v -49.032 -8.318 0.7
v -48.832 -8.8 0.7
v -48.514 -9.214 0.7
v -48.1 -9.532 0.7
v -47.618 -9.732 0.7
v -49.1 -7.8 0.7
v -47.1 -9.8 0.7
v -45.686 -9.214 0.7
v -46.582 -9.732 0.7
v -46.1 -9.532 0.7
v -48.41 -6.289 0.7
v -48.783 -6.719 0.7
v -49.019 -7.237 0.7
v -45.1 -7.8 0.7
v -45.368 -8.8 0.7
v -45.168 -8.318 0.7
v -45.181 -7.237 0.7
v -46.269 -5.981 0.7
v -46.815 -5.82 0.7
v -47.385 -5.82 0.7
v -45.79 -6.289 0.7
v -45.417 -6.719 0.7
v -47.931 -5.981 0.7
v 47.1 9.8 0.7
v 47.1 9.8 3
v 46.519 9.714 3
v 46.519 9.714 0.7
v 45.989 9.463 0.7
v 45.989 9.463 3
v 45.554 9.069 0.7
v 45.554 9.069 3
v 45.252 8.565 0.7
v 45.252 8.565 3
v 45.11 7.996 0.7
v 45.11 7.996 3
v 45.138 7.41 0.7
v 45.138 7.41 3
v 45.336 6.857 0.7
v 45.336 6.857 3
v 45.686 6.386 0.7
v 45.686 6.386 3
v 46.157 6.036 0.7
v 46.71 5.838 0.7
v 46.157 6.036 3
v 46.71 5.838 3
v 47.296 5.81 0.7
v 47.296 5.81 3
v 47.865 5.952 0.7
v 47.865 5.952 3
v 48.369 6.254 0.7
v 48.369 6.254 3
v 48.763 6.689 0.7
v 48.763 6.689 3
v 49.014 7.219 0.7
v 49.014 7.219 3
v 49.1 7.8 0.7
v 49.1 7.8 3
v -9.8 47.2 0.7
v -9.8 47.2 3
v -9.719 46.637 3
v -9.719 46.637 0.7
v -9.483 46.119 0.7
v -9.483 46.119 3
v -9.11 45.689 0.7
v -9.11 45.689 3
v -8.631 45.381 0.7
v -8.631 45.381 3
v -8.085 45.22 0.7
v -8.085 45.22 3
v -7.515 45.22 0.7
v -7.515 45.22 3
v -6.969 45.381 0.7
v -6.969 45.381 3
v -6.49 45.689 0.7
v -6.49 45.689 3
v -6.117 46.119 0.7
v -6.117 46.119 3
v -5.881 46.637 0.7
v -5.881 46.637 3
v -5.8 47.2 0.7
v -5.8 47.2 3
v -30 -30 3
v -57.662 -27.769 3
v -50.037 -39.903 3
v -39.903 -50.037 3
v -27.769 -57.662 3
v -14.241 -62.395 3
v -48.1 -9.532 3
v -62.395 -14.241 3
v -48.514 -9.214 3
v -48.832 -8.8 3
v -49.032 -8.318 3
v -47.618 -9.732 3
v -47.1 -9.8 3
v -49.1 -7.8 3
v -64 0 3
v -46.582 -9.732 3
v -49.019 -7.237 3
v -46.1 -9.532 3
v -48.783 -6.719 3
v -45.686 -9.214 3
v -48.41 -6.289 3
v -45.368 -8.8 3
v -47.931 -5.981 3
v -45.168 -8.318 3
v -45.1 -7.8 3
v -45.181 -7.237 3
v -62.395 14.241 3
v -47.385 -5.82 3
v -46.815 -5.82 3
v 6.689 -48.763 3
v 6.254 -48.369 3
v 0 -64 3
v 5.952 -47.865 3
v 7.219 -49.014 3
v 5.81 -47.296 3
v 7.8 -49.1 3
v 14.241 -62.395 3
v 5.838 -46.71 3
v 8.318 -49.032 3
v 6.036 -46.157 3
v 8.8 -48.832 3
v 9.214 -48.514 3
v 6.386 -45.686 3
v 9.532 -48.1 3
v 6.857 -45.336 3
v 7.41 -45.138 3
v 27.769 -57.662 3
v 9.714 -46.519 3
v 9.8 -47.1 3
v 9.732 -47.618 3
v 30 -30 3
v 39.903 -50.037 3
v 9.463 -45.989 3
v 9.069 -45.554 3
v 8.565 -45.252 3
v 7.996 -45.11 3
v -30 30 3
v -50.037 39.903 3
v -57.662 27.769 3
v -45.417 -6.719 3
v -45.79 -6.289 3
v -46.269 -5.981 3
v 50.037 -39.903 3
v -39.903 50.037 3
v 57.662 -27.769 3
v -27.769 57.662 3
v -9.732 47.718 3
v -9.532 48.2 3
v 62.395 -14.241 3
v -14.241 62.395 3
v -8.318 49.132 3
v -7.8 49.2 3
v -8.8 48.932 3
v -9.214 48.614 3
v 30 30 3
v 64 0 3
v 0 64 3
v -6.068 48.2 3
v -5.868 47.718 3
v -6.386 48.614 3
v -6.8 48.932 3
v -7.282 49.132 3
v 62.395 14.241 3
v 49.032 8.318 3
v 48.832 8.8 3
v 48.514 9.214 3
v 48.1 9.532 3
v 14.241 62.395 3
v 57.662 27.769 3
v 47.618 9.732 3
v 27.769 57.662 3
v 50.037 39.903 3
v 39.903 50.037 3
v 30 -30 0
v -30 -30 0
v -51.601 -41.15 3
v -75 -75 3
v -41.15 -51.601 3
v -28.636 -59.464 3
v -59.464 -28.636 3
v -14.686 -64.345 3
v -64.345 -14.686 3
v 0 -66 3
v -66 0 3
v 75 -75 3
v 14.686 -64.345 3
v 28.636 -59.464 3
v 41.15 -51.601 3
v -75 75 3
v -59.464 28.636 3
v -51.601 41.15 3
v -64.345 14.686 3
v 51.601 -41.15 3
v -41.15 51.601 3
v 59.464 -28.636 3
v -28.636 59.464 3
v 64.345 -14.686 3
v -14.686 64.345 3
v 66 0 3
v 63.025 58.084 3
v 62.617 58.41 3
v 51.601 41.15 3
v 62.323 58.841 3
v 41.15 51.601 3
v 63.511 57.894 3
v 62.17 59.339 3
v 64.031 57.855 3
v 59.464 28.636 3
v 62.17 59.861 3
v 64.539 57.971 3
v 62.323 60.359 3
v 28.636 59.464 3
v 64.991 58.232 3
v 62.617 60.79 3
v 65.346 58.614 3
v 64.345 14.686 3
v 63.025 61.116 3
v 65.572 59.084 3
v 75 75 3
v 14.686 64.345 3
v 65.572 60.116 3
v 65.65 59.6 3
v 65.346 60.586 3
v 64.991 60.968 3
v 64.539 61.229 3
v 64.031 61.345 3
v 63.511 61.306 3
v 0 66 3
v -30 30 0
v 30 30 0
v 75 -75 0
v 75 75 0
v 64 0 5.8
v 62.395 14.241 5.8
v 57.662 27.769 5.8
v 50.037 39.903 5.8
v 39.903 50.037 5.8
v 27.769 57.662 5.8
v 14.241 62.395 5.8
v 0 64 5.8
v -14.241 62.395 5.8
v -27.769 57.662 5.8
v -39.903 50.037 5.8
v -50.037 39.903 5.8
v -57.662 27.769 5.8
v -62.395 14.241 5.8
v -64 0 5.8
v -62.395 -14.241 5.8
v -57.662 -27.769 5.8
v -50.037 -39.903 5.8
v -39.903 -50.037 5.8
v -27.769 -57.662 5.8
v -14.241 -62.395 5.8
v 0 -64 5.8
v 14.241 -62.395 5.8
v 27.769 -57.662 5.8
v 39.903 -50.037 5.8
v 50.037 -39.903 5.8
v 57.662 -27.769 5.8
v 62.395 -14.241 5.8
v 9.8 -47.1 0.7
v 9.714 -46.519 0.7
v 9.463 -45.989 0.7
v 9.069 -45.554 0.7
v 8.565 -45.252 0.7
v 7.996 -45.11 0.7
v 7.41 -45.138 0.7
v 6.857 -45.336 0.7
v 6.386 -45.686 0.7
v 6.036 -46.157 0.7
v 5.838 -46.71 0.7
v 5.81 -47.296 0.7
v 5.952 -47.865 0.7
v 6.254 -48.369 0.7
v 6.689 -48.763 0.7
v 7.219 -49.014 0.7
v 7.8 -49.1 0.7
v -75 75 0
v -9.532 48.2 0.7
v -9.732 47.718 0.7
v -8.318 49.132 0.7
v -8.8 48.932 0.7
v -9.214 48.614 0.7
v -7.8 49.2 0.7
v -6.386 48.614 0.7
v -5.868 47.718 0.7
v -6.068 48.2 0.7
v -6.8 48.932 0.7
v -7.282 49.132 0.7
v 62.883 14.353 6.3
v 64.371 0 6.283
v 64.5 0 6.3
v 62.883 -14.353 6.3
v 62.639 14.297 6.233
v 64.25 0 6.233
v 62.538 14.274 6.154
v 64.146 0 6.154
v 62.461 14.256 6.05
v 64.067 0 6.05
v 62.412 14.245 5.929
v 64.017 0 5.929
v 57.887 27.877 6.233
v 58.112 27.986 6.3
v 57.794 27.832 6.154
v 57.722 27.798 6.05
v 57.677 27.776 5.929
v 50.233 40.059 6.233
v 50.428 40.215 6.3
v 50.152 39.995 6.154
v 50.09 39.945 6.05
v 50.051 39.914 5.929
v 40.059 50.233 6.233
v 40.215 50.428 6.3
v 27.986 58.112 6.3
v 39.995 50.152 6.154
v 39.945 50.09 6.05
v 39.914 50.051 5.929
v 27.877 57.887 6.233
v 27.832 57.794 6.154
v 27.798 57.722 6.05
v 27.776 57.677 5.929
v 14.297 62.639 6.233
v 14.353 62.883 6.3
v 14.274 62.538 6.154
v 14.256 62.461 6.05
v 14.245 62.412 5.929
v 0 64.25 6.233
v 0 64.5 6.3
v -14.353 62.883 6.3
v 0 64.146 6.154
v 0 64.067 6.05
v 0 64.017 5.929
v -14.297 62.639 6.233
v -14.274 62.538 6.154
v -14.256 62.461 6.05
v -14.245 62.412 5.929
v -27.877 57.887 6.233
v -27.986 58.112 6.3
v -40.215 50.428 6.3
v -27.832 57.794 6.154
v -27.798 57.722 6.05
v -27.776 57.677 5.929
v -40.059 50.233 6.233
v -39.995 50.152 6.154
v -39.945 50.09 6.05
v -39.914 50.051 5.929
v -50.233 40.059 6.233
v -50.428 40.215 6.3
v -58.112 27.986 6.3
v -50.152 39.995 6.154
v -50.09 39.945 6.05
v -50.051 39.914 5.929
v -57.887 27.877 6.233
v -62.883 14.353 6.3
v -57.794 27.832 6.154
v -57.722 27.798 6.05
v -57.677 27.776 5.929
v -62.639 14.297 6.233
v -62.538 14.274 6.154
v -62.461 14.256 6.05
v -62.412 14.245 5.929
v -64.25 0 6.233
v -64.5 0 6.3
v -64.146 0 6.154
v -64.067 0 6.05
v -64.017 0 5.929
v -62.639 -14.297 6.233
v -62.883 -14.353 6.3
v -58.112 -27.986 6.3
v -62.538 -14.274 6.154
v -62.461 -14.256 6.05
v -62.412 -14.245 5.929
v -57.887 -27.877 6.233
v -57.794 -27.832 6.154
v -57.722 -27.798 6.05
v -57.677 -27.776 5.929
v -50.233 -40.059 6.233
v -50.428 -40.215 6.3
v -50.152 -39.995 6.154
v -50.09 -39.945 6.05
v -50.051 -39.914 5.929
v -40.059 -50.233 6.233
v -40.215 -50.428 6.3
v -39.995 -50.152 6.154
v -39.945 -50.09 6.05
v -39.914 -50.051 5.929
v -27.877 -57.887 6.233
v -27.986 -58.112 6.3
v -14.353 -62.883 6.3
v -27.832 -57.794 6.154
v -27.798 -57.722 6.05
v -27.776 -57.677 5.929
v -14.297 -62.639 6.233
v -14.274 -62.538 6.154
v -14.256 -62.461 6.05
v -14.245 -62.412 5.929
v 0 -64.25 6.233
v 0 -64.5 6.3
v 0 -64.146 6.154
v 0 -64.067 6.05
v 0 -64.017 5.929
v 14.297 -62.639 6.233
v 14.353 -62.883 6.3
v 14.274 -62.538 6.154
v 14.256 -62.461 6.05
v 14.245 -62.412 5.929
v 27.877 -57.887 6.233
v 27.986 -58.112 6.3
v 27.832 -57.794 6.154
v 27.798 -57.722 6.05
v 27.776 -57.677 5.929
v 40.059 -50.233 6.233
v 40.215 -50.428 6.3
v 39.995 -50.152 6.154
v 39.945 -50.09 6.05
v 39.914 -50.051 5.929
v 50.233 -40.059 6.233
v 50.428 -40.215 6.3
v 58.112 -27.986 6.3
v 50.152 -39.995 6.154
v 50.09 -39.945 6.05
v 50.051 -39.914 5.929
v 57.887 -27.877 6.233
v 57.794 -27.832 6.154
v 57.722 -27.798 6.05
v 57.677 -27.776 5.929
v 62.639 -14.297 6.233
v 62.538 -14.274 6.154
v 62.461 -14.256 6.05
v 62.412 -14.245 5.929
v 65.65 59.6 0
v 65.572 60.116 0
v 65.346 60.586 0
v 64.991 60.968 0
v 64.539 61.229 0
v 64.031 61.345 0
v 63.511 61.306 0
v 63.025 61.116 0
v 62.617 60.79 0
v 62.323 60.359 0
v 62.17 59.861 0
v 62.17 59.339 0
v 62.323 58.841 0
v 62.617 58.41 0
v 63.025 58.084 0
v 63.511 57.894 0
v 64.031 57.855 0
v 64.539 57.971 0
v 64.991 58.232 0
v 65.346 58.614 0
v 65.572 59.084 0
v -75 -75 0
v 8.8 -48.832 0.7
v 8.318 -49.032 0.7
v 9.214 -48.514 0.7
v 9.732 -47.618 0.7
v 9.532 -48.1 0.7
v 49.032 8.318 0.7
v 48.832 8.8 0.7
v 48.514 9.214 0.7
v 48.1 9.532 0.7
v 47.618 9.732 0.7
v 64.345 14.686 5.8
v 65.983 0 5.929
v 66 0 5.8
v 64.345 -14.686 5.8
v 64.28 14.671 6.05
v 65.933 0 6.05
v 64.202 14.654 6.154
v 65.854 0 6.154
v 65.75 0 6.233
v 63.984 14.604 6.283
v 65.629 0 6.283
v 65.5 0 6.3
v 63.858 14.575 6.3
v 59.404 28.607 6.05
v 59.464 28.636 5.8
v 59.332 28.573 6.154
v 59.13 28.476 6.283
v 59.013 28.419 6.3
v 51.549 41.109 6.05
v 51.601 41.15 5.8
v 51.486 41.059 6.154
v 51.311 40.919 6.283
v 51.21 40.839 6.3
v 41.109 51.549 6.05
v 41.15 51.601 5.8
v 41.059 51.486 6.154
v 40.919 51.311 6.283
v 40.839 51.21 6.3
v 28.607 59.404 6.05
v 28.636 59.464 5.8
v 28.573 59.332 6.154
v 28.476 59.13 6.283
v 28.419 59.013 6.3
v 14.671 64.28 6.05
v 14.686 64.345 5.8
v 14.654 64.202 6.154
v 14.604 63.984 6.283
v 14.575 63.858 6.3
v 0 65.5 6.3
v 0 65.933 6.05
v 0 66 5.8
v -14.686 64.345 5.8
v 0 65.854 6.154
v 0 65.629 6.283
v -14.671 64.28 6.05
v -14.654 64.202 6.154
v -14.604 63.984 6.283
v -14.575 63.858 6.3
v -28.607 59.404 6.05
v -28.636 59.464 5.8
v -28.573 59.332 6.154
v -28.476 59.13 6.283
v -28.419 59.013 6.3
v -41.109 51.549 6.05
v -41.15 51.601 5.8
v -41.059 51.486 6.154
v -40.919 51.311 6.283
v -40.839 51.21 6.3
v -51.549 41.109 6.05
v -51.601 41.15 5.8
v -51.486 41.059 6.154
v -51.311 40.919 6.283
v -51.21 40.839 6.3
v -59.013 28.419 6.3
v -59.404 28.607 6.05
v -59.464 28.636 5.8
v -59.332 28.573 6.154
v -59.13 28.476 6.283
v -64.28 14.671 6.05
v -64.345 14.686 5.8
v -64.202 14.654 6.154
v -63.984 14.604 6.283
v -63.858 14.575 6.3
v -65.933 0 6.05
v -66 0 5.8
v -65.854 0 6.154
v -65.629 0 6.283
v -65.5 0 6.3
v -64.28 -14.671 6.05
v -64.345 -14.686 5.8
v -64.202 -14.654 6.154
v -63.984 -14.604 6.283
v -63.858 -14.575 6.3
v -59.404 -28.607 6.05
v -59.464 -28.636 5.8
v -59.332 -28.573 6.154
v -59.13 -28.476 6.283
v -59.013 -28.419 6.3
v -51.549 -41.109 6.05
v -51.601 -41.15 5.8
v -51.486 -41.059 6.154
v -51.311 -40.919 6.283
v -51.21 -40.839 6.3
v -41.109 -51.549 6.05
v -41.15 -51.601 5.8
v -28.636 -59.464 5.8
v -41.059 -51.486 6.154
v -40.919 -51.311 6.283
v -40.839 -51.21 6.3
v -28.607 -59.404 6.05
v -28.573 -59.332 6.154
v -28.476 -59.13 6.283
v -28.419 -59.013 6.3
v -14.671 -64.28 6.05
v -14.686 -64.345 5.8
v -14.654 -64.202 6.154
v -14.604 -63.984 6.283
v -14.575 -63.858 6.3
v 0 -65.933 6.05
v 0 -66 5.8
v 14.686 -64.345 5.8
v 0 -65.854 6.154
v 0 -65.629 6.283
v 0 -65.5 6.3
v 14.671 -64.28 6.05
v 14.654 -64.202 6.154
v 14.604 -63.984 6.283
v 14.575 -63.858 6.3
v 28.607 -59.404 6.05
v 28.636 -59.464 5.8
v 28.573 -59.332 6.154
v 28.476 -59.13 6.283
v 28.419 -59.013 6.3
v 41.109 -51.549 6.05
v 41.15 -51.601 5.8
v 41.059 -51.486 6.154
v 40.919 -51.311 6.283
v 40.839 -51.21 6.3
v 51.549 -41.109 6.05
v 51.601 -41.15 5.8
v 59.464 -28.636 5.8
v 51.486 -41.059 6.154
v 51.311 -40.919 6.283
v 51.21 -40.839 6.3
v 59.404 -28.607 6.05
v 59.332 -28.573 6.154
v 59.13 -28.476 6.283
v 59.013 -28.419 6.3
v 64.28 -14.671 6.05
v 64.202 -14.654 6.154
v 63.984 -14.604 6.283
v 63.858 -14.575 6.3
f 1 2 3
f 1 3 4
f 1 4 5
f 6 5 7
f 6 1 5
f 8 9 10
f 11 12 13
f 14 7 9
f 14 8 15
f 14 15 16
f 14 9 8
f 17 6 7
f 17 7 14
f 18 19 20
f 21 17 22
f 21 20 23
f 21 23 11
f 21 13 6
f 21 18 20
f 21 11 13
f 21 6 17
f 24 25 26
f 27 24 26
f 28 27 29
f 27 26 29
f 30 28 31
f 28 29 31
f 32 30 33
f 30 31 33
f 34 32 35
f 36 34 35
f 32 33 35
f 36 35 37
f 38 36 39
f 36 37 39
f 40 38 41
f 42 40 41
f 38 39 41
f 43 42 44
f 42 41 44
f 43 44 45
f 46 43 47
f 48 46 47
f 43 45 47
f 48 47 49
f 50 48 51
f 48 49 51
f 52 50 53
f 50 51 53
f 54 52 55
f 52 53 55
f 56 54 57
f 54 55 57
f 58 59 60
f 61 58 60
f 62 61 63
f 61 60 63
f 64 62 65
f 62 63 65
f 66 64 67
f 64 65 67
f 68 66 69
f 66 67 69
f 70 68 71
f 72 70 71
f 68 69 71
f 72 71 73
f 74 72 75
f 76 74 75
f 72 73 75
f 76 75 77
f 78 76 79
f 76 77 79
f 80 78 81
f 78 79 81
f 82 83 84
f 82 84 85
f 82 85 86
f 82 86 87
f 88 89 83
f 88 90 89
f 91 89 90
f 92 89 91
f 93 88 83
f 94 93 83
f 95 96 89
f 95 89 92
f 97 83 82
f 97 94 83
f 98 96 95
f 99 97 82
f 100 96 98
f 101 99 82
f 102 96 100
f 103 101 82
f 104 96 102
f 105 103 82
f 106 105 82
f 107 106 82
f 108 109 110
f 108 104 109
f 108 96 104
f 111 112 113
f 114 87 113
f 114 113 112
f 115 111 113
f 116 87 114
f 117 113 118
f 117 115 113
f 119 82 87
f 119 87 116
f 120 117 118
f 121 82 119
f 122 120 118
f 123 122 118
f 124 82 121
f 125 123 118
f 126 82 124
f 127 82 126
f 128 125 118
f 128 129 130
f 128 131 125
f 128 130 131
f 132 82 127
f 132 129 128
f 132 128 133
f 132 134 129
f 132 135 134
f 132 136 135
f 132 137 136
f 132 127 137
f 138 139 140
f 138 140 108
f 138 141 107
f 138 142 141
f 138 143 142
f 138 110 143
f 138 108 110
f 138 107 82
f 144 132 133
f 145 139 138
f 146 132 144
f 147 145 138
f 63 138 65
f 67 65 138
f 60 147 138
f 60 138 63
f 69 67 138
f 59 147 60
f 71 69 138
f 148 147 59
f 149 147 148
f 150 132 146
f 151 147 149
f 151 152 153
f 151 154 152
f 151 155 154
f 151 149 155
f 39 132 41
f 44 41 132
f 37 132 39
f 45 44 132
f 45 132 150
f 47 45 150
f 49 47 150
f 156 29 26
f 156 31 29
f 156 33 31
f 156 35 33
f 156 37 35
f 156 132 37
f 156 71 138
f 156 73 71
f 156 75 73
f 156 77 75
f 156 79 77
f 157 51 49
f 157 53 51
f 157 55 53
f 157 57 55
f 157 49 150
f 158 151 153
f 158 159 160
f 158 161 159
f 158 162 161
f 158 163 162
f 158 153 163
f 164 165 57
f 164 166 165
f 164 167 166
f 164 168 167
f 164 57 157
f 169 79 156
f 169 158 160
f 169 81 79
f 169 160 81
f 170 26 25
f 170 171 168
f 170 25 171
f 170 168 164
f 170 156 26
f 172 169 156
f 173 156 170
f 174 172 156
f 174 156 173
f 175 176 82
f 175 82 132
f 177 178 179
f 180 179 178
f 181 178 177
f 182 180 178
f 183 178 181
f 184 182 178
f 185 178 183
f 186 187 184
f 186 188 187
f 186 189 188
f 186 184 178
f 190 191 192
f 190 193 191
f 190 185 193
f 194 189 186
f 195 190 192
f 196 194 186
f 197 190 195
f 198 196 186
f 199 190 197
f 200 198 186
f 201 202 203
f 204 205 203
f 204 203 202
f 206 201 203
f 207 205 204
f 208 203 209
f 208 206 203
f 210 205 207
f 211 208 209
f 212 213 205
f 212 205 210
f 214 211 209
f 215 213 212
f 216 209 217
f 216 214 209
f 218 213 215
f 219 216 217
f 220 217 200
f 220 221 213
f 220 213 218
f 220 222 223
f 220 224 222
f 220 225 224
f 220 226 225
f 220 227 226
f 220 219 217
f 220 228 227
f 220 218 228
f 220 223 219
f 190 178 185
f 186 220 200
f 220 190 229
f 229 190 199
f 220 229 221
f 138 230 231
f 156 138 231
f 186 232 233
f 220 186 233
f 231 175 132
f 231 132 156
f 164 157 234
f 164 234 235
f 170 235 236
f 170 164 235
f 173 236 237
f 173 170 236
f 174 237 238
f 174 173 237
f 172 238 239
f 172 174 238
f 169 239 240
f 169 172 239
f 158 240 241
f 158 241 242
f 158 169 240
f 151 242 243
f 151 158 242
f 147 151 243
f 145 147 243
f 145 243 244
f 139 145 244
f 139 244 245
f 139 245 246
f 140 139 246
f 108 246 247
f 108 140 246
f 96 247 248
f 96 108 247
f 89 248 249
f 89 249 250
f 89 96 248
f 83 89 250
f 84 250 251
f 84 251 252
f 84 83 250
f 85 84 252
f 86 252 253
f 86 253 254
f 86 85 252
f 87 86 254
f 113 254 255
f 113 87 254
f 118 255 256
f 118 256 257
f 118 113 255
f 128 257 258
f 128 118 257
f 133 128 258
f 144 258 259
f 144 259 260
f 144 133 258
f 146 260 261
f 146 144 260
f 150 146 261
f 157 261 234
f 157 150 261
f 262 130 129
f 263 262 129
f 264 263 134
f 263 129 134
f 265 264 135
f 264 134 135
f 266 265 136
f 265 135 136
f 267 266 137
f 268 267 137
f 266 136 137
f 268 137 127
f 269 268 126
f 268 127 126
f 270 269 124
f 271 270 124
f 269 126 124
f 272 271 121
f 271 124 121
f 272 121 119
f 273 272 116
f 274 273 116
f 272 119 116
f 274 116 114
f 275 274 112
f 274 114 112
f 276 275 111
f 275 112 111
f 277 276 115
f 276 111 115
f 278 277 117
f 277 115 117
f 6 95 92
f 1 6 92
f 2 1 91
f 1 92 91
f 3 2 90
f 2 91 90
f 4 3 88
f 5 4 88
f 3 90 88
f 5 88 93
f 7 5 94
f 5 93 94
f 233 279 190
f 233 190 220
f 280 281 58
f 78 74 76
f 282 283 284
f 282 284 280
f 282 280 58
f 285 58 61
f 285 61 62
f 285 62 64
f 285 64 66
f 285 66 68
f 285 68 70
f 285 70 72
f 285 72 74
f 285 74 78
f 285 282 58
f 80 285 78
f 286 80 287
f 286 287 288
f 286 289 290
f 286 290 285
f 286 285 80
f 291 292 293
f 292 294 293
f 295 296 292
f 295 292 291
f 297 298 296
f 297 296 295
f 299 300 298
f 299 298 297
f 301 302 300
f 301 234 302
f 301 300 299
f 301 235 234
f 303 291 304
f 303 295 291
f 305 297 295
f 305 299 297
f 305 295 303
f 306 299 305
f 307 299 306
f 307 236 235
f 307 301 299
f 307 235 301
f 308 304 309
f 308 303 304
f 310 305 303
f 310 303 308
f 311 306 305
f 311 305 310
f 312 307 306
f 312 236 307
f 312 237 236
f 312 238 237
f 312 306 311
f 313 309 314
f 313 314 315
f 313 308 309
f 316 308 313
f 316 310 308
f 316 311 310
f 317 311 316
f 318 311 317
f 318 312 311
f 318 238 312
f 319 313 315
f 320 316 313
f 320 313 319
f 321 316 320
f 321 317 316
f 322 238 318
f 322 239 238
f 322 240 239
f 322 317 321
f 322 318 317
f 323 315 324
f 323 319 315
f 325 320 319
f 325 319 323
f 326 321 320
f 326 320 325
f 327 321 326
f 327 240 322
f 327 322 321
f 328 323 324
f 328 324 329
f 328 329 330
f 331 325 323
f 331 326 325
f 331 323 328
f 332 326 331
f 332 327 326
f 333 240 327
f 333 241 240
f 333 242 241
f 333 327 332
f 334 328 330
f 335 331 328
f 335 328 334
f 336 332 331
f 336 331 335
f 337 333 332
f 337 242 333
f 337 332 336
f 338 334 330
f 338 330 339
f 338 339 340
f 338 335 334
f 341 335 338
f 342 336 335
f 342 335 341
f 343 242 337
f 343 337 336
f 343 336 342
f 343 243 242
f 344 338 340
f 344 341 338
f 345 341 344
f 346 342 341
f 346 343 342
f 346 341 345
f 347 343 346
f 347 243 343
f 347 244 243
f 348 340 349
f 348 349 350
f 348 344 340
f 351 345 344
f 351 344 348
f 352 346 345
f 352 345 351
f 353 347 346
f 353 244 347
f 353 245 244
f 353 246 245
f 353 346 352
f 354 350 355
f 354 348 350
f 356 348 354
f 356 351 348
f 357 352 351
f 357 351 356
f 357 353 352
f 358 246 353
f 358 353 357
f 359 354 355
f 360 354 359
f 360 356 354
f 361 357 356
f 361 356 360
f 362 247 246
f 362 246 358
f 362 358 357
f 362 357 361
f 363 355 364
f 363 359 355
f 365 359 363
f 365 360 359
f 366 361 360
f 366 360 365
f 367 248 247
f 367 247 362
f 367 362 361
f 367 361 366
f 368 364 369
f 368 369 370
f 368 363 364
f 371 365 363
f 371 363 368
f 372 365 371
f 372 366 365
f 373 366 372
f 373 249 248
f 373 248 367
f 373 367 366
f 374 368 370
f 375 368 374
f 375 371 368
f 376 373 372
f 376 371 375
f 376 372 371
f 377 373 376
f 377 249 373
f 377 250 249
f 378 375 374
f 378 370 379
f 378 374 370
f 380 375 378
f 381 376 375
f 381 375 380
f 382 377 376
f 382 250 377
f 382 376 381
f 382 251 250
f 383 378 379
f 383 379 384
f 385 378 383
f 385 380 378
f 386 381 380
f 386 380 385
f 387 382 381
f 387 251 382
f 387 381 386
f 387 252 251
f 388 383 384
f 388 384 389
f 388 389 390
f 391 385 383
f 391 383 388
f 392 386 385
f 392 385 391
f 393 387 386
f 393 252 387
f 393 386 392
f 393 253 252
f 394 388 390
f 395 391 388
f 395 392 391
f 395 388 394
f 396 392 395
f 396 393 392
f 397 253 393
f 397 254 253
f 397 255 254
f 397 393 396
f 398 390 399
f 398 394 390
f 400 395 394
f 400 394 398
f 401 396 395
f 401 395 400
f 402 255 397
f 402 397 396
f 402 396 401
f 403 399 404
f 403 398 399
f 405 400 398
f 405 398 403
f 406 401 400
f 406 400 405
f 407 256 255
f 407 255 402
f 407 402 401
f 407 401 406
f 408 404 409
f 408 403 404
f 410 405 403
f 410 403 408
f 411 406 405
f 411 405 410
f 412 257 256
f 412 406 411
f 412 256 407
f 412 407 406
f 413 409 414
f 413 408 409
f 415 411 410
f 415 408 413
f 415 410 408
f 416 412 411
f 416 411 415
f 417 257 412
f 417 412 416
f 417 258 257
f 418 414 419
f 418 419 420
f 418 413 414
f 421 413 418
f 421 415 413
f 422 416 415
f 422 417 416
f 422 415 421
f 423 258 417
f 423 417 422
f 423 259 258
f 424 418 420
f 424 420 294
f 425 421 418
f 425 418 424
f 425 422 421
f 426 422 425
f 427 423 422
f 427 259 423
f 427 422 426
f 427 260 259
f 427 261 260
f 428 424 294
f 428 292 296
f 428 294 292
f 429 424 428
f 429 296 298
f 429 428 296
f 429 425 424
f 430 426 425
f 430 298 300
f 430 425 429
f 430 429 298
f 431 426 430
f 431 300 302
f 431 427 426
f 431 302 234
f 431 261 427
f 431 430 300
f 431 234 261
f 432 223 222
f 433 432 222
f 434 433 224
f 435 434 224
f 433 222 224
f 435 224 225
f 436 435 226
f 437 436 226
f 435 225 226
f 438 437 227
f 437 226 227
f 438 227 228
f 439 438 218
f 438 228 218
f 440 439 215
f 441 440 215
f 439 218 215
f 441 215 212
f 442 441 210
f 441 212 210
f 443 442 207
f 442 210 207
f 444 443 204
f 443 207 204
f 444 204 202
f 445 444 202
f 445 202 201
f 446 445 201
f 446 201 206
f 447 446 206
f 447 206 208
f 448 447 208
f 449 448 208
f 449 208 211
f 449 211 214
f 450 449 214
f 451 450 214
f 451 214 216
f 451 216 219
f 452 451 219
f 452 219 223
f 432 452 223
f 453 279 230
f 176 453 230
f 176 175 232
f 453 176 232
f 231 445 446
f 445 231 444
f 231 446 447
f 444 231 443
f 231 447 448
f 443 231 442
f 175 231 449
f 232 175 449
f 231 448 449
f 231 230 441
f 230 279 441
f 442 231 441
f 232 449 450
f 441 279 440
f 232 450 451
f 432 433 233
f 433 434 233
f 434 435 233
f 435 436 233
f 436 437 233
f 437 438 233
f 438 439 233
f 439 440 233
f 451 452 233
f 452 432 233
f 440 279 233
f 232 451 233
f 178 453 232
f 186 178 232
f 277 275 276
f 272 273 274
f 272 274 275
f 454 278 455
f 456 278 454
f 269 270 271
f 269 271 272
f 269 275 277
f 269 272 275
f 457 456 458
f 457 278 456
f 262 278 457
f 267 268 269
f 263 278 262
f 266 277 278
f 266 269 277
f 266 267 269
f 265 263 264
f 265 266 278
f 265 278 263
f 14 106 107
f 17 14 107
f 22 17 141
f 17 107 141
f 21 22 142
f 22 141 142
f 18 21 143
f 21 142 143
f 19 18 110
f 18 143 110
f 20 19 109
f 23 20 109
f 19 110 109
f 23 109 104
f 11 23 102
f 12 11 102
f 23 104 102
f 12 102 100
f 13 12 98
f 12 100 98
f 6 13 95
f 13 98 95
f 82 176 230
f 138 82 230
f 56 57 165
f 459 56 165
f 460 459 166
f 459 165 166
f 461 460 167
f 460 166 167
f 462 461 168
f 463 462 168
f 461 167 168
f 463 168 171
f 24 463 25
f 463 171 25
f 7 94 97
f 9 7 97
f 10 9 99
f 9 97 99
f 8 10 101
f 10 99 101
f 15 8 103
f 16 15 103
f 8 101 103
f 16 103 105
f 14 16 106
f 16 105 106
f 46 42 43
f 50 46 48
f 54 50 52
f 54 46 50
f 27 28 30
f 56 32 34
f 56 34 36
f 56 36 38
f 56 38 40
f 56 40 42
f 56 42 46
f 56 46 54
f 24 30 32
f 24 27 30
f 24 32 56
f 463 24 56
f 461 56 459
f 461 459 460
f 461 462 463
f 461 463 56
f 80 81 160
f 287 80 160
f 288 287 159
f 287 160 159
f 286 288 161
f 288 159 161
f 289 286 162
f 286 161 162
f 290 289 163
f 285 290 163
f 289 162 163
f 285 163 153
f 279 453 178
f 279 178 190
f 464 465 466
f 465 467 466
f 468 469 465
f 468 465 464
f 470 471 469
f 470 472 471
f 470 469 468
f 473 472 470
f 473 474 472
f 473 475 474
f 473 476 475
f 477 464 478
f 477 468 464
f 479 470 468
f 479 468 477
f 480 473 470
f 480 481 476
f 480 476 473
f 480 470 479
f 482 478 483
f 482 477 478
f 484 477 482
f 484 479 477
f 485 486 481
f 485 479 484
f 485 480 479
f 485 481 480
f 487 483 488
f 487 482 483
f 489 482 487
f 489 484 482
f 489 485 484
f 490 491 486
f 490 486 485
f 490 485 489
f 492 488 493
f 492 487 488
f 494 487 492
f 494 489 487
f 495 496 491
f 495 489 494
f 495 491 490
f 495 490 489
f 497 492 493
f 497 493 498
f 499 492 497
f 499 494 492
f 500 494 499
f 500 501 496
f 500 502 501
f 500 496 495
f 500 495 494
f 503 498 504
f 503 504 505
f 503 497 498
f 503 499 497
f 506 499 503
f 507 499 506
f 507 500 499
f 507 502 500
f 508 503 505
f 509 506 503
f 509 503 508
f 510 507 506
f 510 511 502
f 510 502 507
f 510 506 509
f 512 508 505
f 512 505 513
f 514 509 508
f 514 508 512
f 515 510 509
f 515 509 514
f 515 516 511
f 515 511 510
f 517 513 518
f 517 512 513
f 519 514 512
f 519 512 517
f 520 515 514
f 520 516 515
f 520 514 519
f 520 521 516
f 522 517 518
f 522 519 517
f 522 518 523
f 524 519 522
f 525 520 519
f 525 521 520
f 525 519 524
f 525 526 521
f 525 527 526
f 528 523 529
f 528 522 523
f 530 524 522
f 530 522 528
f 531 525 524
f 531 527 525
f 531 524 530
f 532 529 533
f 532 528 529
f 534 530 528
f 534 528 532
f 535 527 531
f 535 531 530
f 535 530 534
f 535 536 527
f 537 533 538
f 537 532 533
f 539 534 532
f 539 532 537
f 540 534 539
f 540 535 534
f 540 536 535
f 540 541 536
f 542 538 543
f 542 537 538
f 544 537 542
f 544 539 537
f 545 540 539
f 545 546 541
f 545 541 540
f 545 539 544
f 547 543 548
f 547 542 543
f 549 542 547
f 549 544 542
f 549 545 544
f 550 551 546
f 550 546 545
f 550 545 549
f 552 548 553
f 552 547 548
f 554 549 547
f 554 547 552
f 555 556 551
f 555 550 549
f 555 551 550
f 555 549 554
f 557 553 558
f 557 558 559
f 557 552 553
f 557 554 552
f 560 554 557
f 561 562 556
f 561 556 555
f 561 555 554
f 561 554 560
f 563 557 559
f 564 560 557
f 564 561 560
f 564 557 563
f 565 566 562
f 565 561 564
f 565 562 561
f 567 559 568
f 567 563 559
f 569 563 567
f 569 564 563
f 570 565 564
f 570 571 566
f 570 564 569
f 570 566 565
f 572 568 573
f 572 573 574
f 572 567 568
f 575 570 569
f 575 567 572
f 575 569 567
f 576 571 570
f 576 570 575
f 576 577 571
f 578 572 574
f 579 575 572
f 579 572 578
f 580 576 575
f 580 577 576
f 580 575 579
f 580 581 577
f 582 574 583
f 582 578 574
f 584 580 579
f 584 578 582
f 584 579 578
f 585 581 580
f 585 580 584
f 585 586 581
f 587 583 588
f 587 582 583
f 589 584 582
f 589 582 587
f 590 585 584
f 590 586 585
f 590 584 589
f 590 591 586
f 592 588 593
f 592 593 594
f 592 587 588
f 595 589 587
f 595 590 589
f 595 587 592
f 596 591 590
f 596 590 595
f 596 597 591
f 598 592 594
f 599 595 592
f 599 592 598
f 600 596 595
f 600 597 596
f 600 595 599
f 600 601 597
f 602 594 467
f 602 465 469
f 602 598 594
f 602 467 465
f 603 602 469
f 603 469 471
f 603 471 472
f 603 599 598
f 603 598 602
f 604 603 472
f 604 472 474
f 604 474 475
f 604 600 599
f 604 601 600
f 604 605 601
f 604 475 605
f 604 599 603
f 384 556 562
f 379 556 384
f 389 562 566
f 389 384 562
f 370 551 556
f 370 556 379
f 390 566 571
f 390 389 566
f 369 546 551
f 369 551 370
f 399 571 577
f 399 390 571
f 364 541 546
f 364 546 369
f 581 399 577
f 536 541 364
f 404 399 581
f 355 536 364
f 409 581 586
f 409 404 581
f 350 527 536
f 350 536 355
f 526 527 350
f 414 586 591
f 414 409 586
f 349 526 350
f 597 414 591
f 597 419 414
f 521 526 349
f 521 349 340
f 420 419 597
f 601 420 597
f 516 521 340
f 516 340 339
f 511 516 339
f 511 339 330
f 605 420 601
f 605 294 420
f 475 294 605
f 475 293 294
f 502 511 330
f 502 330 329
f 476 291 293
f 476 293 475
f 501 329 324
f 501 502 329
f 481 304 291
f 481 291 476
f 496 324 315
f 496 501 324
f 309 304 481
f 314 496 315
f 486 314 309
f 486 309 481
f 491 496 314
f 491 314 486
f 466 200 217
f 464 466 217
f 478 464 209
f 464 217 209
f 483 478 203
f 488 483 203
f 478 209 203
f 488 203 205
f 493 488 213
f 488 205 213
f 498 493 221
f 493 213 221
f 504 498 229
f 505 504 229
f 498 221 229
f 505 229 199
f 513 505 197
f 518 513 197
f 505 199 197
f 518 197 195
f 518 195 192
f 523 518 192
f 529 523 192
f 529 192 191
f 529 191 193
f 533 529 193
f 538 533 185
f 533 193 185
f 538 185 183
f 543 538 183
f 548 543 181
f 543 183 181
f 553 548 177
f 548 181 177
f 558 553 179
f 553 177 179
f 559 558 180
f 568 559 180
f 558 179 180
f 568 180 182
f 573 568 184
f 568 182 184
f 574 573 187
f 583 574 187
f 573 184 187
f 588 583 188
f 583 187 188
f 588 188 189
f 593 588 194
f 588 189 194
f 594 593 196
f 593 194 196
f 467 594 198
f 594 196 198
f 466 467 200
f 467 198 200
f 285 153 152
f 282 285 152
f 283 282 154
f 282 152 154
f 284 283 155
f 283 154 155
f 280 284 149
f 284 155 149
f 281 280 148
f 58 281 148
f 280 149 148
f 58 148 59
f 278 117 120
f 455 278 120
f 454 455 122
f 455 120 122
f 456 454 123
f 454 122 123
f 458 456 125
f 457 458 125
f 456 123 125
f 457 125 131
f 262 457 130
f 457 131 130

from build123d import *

# Parameters (mm, degrees)
F0_W     = 150
F0_H     = 150
F0_W_2   = 60
F0_H_2   = 60
F1_DEPTH = 3
F2_R     = 66
F2_R_2   = 64
F3_DEPTH = 3.3
F5_DEPTH = 2.3
F6_R     = 0.5
F7_R     = 0.5
F4_R     = 1.75
F8_DEPTH = 25


# Not quite as in the source:
# - a feature names something its author has since deleted; it is built from what else it names


with BuildPart() as f1:
    # F0 (on Top) → F1 (new body)
    with BuildSketch(Plane.XY):
        Rectangle(F0_W, F0_H)
        Rectangle(F0_W_2, F0_H_2, mode=Mode.SUBTRACT)
    extrude(amount=F1_DEPTH)

    # F2 (on face) → F3 (join)
    with BuildSketch(Plane.XY.offset(3)):
        Circle(F2_R)
        Circle(F2_R_2, mode=Mode.SUBTRACT)
    extrude(amount=F3_DEPTH)

    # F4 (on face) → F5 (cut)
    with BuildSketch(Plane.XY.offset(3)):
        with BuildLine():
            ThreePointArc((-49.1, -7.8), (-48.5142135624, -9.2142135624), (-47.1, -9.8))
            Line((-47.1, -9.8), (-47.1, -7.8))
            Line((-47.1, -7.8), (-49.1, -7.8))
        make_face()
        with BuildLine():
            Line((-47.1, -7.8), (-47.1, -9.8))
            ThreePointArc((-47.1, -9.8), (-45.6857864376, -9.2142135624), (-45.1, -7.8))
            ThreePointArc((-45.1, -7.8), (-47.1, -5.8), (-49.1, -7.8))
            Line((-49.1, -7.8), (-47.1, -7.8))
        make_face()
        with BuildLine():
            Line((-7.8, 47.2), (-9.8, 47.2))
            ThreePointArc((-9.8, 47.2), (-7.8, 45.2), (-5.8, 47.2))
            ThreePointArc((-5.8, 47.2), (-6.3857864376, 48.6142135624), (-7.8, 49.2))
            Line((-7.8, 49.2), (-7.8, 47.2))
        make_face()
        with BuildLine():
            ThreePointArc((-7.8, 49.2), (-9.2142135624, 48.6142135624), (-9.8, 47.2))
            Line((-9.8, 47.2), (-7.8, 47.2))
            Line((-7.8, 47.2), (-7.8, 49.2))
        make_face()
        with BuildLine():
            Line((47.1, 7.8), (47.1, 9.8))
            ThreePointArc((47.1, 9.8), (45.6857864376, 6.3857864376), (49.1, 7.8))
            Line((49.1, 7.8), (47.1, 7.8))
        make_face()
        with BuildLine():
            ThreePointArc((49.1, 7.8), (48.5142135624, 9.2142135624), (47.1, 9.8))
            Line((47.1, 9.8), (47.1, 7.8))
            Line((47.1, 7.8), (49.1, 7.8))
        make_face()
        with BuildLine():
            ThreePointArc((9.8, -47.1), (6.3857864376, -45.6857864376), (7.8, -49.1))
            Line((7.8, -49.1), (7.8, -47.1))
            Line((7.8, -47.1), (9.8, -47.1))
        make_face()
        with BuildLine():
            Line((7.8, -47.1), (7.8, -49.1))
            ThreePointArc((7.8, -49.1), (9.2142135624, -48.5142135624), (9.8, -47.1))
            Line((9.8, -47.1), (7.8, -47.1))
        make_face()
    extrude(amount=-F5_DEPTH, mode=Mode.SUBTRACT)

    # F6
    f6_edges = [f1.edges().sort_by_distance(p)[0] for p in [
        (-66, 0, 6.3),
    ]]
    fillet(f6_edges, radius=F6_R)

    # F7
    f7_edges = [f1.edges().sort_by_distance(p)[0] for p in [
        (-64, 0, 6.3),
    ]]
    fillet(f7_edges, radius=F7_R)

    # F4 (on face) → F8 (cut)
    with BuildSketch(Plane.XY.offset(3)):
        with Locations((63.9, 59.6)):
            Circle(F4_R)
    extrude(amount=-F8_DEPTH, mode=Mode.SUBTRACT)


solid = f1.part
